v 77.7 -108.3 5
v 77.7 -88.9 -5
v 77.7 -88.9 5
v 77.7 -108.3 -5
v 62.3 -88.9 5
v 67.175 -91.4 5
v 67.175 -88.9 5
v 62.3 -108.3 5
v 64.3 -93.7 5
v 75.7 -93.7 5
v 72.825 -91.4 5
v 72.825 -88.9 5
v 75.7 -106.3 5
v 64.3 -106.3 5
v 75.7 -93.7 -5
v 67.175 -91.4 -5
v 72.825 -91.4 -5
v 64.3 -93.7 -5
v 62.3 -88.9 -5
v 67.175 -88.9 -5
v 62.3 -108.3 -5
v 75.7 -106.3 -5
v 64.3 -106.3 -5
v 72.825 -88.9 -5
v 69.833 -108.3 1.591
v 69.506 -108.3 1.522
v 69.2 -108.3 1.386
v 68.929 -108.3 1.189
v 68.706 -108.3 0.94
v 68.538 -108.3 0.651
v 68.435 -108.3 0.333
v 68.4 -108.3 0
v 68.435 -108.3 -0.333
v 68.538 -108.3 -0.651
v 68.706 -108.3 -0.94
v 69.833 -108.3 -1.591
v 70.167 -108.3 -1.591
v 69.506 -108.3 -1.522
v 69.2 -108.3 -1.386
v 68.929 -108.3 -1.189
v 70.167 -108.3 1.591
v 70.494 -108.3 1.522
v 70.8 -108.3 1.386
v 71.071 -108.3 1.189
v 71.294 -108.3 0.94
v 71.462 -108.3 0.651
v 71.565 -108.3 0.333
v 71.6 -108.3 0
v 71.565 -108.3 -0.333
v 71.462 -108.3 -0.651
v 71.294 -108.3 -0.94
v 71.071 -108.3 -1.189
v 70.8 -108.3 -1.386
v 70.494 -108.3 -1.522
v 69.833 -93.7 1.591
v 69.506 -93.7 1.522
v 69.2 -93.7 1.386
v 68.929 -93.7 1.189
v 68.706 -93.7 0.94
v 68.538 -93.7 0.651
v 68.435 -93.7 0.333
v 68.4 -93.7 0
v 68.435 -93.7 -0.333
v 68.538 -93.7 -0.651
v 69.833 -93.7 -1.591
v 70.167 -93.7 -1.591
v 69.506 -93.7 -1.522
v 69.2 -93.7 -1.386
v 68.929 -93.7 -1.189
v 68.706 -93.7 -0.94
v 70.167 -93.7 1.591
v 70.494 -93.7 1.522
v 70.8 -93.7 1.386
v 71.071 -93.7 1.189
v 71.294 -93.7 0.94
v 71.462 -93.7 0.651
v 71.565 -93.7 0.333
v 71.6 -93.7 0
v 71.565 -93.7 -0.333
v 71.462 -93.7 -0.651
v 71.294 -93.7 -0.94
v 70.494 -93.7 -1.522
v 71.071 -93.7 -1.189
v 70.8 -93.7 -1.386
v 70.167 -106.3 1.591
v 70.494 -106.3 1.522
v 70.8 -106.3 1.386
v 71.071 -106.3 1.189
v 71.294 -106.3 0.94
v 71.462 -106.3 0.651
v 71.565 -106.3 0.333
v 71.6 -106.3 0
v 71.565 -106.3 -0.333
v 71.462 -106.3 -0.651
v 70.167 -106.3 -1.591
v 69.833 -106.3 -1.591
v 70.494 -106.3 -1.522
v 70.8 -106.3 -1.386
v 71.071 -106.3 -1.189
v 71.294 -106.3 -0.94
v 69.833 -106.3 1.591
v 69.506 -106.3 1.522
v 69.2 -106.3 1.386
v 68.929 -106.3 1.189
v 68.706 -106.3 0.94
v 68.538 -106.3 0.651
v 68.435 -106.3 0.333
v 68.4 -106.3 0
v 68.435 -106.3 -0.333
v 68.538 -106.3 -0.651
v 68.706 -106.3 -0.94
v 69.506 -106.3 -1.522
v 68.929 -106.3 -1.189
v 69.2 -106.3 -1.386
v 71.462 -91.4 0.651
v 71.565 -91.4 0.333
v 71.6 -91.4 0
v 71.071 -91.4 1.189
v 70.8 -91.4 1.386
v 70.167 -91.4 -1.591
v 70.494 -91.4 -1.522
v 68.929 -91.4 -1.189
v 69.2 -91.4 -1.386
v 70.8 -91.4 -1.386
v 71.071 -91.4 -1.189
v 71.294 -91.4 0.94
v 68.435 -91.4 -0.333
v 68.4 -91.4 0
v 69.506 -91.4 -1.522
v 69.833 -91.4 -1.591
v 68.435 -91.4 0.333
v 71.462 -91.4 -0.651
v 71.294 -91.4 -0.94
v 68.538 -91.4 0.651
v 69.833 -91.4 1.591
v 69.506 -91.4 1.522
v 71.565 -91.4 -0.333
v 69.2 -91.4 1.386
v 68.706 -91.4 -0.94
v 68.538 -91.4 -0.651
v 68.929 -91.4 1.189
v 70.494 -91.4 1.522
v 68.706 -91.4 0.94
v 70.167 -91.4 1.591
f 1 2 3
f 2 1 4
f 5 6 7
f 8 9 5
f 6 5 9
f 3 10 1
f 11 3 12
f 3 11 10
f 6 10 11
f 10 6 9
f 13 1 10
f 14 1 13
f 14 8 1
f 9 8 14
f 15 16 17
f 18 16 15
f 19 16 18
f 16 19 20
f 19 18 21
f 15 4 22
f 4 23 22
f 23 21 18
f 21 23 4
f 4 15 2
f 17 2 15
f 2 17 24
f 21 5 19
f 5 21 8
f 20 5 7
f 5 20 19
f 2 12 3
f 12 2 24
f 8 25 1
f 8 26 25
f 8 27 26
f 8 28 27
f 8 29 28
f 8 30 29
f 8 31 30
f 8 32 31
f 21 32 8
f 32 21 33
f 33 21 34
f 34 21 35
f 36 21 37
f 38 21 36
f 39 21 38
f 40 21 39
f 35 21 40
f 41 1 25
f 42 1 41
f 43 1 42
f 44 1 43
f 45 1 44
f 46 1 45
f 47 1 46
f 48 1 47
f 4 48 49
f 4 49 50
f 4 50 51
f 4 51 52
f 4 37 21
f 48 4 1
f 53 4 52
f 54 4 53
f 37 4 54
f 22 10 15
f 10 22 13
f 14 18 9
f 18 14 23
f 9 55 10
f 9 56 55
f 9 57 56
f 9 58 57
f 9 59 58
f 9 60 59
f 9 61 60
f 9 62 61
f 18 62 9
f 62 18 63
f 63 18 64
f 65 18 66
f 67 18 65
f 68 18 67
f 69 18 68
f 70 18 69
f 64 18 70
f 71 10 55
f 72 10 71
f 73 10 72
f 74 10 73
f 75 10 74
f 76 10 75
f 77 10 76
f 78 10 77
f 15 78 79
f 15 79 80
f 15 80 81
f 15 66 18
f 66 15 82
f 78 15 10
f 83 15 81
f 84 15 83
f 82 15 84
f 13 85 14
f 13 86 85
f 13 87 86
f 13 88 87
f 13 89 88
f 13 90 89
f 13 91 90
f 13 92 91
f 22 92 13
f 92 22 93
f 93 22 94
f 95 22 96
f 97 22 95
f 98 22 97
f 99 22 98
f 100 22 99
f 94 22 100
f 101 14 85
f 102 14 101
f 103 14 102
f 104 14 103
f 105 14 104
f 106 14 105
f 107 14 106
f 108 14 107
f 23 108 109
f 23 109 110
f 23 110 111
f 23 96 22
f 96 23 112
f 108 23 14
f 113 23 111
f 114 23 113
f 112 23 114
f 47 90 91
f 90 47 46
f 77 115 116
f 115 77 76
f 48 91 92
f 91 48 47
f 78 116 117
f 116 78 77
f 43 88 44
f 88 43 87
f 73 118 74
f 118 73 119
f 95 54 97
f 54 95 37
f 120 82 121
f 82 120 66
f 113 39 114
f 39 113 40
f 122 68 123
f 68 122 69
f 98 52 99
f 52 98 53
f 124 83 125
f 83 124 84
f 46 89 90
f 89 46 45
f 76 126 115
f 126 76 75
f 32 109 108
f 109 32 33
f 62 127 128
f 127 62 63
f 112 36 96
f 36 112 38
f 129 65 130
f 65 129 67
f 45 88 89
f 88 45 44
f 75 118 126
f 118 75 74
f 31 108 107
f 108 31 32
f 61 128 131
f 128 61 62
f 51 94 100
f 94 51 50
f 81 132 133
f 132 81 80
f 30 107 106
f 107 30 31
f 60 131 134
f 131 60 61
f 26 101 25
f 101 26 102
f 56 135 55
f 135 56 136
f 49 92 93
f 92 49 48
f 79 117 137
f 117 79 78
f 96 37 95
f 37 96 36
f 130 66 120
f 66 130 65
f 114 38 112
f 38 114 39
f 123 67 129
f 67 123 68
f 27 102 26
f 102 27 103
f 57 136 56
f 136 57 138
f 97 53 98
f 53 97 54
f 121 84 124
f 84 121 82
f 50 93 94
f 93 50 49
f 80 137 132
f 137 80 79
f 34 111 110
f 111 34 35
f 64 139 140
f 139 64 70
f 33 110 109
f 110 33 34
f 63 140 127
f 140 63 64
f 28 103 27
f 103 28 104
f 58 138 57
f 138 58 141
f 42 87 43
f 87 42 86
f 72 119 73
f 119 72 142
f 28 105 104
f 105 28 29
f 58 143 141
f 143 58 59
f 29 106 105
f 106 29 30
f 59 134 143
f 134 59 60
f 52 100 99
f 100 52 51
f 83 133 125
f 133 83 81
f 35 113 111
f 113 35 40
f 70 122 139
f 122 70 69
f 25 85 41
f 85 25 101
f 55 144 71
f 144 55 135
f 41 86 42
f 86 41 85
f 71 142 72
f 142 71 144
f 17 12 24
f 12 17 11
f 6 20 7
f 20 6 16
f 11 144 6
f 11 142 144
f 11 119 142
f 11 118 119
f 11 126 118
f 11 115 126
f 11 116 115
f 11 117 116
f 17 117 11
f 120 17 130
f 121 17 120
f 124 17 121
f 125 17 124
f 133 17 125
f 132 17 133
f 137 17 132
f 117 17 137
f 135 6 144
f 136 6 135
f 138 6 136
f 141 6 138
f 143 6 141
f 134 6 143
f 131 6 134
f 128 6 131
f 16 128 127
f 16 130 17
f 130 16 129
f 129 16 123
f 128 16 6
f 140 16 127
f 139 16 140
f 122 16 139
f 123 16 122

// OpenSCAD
use <bed_carriage.scad>

height = 12;
translate([70, -100]) boltholder();
